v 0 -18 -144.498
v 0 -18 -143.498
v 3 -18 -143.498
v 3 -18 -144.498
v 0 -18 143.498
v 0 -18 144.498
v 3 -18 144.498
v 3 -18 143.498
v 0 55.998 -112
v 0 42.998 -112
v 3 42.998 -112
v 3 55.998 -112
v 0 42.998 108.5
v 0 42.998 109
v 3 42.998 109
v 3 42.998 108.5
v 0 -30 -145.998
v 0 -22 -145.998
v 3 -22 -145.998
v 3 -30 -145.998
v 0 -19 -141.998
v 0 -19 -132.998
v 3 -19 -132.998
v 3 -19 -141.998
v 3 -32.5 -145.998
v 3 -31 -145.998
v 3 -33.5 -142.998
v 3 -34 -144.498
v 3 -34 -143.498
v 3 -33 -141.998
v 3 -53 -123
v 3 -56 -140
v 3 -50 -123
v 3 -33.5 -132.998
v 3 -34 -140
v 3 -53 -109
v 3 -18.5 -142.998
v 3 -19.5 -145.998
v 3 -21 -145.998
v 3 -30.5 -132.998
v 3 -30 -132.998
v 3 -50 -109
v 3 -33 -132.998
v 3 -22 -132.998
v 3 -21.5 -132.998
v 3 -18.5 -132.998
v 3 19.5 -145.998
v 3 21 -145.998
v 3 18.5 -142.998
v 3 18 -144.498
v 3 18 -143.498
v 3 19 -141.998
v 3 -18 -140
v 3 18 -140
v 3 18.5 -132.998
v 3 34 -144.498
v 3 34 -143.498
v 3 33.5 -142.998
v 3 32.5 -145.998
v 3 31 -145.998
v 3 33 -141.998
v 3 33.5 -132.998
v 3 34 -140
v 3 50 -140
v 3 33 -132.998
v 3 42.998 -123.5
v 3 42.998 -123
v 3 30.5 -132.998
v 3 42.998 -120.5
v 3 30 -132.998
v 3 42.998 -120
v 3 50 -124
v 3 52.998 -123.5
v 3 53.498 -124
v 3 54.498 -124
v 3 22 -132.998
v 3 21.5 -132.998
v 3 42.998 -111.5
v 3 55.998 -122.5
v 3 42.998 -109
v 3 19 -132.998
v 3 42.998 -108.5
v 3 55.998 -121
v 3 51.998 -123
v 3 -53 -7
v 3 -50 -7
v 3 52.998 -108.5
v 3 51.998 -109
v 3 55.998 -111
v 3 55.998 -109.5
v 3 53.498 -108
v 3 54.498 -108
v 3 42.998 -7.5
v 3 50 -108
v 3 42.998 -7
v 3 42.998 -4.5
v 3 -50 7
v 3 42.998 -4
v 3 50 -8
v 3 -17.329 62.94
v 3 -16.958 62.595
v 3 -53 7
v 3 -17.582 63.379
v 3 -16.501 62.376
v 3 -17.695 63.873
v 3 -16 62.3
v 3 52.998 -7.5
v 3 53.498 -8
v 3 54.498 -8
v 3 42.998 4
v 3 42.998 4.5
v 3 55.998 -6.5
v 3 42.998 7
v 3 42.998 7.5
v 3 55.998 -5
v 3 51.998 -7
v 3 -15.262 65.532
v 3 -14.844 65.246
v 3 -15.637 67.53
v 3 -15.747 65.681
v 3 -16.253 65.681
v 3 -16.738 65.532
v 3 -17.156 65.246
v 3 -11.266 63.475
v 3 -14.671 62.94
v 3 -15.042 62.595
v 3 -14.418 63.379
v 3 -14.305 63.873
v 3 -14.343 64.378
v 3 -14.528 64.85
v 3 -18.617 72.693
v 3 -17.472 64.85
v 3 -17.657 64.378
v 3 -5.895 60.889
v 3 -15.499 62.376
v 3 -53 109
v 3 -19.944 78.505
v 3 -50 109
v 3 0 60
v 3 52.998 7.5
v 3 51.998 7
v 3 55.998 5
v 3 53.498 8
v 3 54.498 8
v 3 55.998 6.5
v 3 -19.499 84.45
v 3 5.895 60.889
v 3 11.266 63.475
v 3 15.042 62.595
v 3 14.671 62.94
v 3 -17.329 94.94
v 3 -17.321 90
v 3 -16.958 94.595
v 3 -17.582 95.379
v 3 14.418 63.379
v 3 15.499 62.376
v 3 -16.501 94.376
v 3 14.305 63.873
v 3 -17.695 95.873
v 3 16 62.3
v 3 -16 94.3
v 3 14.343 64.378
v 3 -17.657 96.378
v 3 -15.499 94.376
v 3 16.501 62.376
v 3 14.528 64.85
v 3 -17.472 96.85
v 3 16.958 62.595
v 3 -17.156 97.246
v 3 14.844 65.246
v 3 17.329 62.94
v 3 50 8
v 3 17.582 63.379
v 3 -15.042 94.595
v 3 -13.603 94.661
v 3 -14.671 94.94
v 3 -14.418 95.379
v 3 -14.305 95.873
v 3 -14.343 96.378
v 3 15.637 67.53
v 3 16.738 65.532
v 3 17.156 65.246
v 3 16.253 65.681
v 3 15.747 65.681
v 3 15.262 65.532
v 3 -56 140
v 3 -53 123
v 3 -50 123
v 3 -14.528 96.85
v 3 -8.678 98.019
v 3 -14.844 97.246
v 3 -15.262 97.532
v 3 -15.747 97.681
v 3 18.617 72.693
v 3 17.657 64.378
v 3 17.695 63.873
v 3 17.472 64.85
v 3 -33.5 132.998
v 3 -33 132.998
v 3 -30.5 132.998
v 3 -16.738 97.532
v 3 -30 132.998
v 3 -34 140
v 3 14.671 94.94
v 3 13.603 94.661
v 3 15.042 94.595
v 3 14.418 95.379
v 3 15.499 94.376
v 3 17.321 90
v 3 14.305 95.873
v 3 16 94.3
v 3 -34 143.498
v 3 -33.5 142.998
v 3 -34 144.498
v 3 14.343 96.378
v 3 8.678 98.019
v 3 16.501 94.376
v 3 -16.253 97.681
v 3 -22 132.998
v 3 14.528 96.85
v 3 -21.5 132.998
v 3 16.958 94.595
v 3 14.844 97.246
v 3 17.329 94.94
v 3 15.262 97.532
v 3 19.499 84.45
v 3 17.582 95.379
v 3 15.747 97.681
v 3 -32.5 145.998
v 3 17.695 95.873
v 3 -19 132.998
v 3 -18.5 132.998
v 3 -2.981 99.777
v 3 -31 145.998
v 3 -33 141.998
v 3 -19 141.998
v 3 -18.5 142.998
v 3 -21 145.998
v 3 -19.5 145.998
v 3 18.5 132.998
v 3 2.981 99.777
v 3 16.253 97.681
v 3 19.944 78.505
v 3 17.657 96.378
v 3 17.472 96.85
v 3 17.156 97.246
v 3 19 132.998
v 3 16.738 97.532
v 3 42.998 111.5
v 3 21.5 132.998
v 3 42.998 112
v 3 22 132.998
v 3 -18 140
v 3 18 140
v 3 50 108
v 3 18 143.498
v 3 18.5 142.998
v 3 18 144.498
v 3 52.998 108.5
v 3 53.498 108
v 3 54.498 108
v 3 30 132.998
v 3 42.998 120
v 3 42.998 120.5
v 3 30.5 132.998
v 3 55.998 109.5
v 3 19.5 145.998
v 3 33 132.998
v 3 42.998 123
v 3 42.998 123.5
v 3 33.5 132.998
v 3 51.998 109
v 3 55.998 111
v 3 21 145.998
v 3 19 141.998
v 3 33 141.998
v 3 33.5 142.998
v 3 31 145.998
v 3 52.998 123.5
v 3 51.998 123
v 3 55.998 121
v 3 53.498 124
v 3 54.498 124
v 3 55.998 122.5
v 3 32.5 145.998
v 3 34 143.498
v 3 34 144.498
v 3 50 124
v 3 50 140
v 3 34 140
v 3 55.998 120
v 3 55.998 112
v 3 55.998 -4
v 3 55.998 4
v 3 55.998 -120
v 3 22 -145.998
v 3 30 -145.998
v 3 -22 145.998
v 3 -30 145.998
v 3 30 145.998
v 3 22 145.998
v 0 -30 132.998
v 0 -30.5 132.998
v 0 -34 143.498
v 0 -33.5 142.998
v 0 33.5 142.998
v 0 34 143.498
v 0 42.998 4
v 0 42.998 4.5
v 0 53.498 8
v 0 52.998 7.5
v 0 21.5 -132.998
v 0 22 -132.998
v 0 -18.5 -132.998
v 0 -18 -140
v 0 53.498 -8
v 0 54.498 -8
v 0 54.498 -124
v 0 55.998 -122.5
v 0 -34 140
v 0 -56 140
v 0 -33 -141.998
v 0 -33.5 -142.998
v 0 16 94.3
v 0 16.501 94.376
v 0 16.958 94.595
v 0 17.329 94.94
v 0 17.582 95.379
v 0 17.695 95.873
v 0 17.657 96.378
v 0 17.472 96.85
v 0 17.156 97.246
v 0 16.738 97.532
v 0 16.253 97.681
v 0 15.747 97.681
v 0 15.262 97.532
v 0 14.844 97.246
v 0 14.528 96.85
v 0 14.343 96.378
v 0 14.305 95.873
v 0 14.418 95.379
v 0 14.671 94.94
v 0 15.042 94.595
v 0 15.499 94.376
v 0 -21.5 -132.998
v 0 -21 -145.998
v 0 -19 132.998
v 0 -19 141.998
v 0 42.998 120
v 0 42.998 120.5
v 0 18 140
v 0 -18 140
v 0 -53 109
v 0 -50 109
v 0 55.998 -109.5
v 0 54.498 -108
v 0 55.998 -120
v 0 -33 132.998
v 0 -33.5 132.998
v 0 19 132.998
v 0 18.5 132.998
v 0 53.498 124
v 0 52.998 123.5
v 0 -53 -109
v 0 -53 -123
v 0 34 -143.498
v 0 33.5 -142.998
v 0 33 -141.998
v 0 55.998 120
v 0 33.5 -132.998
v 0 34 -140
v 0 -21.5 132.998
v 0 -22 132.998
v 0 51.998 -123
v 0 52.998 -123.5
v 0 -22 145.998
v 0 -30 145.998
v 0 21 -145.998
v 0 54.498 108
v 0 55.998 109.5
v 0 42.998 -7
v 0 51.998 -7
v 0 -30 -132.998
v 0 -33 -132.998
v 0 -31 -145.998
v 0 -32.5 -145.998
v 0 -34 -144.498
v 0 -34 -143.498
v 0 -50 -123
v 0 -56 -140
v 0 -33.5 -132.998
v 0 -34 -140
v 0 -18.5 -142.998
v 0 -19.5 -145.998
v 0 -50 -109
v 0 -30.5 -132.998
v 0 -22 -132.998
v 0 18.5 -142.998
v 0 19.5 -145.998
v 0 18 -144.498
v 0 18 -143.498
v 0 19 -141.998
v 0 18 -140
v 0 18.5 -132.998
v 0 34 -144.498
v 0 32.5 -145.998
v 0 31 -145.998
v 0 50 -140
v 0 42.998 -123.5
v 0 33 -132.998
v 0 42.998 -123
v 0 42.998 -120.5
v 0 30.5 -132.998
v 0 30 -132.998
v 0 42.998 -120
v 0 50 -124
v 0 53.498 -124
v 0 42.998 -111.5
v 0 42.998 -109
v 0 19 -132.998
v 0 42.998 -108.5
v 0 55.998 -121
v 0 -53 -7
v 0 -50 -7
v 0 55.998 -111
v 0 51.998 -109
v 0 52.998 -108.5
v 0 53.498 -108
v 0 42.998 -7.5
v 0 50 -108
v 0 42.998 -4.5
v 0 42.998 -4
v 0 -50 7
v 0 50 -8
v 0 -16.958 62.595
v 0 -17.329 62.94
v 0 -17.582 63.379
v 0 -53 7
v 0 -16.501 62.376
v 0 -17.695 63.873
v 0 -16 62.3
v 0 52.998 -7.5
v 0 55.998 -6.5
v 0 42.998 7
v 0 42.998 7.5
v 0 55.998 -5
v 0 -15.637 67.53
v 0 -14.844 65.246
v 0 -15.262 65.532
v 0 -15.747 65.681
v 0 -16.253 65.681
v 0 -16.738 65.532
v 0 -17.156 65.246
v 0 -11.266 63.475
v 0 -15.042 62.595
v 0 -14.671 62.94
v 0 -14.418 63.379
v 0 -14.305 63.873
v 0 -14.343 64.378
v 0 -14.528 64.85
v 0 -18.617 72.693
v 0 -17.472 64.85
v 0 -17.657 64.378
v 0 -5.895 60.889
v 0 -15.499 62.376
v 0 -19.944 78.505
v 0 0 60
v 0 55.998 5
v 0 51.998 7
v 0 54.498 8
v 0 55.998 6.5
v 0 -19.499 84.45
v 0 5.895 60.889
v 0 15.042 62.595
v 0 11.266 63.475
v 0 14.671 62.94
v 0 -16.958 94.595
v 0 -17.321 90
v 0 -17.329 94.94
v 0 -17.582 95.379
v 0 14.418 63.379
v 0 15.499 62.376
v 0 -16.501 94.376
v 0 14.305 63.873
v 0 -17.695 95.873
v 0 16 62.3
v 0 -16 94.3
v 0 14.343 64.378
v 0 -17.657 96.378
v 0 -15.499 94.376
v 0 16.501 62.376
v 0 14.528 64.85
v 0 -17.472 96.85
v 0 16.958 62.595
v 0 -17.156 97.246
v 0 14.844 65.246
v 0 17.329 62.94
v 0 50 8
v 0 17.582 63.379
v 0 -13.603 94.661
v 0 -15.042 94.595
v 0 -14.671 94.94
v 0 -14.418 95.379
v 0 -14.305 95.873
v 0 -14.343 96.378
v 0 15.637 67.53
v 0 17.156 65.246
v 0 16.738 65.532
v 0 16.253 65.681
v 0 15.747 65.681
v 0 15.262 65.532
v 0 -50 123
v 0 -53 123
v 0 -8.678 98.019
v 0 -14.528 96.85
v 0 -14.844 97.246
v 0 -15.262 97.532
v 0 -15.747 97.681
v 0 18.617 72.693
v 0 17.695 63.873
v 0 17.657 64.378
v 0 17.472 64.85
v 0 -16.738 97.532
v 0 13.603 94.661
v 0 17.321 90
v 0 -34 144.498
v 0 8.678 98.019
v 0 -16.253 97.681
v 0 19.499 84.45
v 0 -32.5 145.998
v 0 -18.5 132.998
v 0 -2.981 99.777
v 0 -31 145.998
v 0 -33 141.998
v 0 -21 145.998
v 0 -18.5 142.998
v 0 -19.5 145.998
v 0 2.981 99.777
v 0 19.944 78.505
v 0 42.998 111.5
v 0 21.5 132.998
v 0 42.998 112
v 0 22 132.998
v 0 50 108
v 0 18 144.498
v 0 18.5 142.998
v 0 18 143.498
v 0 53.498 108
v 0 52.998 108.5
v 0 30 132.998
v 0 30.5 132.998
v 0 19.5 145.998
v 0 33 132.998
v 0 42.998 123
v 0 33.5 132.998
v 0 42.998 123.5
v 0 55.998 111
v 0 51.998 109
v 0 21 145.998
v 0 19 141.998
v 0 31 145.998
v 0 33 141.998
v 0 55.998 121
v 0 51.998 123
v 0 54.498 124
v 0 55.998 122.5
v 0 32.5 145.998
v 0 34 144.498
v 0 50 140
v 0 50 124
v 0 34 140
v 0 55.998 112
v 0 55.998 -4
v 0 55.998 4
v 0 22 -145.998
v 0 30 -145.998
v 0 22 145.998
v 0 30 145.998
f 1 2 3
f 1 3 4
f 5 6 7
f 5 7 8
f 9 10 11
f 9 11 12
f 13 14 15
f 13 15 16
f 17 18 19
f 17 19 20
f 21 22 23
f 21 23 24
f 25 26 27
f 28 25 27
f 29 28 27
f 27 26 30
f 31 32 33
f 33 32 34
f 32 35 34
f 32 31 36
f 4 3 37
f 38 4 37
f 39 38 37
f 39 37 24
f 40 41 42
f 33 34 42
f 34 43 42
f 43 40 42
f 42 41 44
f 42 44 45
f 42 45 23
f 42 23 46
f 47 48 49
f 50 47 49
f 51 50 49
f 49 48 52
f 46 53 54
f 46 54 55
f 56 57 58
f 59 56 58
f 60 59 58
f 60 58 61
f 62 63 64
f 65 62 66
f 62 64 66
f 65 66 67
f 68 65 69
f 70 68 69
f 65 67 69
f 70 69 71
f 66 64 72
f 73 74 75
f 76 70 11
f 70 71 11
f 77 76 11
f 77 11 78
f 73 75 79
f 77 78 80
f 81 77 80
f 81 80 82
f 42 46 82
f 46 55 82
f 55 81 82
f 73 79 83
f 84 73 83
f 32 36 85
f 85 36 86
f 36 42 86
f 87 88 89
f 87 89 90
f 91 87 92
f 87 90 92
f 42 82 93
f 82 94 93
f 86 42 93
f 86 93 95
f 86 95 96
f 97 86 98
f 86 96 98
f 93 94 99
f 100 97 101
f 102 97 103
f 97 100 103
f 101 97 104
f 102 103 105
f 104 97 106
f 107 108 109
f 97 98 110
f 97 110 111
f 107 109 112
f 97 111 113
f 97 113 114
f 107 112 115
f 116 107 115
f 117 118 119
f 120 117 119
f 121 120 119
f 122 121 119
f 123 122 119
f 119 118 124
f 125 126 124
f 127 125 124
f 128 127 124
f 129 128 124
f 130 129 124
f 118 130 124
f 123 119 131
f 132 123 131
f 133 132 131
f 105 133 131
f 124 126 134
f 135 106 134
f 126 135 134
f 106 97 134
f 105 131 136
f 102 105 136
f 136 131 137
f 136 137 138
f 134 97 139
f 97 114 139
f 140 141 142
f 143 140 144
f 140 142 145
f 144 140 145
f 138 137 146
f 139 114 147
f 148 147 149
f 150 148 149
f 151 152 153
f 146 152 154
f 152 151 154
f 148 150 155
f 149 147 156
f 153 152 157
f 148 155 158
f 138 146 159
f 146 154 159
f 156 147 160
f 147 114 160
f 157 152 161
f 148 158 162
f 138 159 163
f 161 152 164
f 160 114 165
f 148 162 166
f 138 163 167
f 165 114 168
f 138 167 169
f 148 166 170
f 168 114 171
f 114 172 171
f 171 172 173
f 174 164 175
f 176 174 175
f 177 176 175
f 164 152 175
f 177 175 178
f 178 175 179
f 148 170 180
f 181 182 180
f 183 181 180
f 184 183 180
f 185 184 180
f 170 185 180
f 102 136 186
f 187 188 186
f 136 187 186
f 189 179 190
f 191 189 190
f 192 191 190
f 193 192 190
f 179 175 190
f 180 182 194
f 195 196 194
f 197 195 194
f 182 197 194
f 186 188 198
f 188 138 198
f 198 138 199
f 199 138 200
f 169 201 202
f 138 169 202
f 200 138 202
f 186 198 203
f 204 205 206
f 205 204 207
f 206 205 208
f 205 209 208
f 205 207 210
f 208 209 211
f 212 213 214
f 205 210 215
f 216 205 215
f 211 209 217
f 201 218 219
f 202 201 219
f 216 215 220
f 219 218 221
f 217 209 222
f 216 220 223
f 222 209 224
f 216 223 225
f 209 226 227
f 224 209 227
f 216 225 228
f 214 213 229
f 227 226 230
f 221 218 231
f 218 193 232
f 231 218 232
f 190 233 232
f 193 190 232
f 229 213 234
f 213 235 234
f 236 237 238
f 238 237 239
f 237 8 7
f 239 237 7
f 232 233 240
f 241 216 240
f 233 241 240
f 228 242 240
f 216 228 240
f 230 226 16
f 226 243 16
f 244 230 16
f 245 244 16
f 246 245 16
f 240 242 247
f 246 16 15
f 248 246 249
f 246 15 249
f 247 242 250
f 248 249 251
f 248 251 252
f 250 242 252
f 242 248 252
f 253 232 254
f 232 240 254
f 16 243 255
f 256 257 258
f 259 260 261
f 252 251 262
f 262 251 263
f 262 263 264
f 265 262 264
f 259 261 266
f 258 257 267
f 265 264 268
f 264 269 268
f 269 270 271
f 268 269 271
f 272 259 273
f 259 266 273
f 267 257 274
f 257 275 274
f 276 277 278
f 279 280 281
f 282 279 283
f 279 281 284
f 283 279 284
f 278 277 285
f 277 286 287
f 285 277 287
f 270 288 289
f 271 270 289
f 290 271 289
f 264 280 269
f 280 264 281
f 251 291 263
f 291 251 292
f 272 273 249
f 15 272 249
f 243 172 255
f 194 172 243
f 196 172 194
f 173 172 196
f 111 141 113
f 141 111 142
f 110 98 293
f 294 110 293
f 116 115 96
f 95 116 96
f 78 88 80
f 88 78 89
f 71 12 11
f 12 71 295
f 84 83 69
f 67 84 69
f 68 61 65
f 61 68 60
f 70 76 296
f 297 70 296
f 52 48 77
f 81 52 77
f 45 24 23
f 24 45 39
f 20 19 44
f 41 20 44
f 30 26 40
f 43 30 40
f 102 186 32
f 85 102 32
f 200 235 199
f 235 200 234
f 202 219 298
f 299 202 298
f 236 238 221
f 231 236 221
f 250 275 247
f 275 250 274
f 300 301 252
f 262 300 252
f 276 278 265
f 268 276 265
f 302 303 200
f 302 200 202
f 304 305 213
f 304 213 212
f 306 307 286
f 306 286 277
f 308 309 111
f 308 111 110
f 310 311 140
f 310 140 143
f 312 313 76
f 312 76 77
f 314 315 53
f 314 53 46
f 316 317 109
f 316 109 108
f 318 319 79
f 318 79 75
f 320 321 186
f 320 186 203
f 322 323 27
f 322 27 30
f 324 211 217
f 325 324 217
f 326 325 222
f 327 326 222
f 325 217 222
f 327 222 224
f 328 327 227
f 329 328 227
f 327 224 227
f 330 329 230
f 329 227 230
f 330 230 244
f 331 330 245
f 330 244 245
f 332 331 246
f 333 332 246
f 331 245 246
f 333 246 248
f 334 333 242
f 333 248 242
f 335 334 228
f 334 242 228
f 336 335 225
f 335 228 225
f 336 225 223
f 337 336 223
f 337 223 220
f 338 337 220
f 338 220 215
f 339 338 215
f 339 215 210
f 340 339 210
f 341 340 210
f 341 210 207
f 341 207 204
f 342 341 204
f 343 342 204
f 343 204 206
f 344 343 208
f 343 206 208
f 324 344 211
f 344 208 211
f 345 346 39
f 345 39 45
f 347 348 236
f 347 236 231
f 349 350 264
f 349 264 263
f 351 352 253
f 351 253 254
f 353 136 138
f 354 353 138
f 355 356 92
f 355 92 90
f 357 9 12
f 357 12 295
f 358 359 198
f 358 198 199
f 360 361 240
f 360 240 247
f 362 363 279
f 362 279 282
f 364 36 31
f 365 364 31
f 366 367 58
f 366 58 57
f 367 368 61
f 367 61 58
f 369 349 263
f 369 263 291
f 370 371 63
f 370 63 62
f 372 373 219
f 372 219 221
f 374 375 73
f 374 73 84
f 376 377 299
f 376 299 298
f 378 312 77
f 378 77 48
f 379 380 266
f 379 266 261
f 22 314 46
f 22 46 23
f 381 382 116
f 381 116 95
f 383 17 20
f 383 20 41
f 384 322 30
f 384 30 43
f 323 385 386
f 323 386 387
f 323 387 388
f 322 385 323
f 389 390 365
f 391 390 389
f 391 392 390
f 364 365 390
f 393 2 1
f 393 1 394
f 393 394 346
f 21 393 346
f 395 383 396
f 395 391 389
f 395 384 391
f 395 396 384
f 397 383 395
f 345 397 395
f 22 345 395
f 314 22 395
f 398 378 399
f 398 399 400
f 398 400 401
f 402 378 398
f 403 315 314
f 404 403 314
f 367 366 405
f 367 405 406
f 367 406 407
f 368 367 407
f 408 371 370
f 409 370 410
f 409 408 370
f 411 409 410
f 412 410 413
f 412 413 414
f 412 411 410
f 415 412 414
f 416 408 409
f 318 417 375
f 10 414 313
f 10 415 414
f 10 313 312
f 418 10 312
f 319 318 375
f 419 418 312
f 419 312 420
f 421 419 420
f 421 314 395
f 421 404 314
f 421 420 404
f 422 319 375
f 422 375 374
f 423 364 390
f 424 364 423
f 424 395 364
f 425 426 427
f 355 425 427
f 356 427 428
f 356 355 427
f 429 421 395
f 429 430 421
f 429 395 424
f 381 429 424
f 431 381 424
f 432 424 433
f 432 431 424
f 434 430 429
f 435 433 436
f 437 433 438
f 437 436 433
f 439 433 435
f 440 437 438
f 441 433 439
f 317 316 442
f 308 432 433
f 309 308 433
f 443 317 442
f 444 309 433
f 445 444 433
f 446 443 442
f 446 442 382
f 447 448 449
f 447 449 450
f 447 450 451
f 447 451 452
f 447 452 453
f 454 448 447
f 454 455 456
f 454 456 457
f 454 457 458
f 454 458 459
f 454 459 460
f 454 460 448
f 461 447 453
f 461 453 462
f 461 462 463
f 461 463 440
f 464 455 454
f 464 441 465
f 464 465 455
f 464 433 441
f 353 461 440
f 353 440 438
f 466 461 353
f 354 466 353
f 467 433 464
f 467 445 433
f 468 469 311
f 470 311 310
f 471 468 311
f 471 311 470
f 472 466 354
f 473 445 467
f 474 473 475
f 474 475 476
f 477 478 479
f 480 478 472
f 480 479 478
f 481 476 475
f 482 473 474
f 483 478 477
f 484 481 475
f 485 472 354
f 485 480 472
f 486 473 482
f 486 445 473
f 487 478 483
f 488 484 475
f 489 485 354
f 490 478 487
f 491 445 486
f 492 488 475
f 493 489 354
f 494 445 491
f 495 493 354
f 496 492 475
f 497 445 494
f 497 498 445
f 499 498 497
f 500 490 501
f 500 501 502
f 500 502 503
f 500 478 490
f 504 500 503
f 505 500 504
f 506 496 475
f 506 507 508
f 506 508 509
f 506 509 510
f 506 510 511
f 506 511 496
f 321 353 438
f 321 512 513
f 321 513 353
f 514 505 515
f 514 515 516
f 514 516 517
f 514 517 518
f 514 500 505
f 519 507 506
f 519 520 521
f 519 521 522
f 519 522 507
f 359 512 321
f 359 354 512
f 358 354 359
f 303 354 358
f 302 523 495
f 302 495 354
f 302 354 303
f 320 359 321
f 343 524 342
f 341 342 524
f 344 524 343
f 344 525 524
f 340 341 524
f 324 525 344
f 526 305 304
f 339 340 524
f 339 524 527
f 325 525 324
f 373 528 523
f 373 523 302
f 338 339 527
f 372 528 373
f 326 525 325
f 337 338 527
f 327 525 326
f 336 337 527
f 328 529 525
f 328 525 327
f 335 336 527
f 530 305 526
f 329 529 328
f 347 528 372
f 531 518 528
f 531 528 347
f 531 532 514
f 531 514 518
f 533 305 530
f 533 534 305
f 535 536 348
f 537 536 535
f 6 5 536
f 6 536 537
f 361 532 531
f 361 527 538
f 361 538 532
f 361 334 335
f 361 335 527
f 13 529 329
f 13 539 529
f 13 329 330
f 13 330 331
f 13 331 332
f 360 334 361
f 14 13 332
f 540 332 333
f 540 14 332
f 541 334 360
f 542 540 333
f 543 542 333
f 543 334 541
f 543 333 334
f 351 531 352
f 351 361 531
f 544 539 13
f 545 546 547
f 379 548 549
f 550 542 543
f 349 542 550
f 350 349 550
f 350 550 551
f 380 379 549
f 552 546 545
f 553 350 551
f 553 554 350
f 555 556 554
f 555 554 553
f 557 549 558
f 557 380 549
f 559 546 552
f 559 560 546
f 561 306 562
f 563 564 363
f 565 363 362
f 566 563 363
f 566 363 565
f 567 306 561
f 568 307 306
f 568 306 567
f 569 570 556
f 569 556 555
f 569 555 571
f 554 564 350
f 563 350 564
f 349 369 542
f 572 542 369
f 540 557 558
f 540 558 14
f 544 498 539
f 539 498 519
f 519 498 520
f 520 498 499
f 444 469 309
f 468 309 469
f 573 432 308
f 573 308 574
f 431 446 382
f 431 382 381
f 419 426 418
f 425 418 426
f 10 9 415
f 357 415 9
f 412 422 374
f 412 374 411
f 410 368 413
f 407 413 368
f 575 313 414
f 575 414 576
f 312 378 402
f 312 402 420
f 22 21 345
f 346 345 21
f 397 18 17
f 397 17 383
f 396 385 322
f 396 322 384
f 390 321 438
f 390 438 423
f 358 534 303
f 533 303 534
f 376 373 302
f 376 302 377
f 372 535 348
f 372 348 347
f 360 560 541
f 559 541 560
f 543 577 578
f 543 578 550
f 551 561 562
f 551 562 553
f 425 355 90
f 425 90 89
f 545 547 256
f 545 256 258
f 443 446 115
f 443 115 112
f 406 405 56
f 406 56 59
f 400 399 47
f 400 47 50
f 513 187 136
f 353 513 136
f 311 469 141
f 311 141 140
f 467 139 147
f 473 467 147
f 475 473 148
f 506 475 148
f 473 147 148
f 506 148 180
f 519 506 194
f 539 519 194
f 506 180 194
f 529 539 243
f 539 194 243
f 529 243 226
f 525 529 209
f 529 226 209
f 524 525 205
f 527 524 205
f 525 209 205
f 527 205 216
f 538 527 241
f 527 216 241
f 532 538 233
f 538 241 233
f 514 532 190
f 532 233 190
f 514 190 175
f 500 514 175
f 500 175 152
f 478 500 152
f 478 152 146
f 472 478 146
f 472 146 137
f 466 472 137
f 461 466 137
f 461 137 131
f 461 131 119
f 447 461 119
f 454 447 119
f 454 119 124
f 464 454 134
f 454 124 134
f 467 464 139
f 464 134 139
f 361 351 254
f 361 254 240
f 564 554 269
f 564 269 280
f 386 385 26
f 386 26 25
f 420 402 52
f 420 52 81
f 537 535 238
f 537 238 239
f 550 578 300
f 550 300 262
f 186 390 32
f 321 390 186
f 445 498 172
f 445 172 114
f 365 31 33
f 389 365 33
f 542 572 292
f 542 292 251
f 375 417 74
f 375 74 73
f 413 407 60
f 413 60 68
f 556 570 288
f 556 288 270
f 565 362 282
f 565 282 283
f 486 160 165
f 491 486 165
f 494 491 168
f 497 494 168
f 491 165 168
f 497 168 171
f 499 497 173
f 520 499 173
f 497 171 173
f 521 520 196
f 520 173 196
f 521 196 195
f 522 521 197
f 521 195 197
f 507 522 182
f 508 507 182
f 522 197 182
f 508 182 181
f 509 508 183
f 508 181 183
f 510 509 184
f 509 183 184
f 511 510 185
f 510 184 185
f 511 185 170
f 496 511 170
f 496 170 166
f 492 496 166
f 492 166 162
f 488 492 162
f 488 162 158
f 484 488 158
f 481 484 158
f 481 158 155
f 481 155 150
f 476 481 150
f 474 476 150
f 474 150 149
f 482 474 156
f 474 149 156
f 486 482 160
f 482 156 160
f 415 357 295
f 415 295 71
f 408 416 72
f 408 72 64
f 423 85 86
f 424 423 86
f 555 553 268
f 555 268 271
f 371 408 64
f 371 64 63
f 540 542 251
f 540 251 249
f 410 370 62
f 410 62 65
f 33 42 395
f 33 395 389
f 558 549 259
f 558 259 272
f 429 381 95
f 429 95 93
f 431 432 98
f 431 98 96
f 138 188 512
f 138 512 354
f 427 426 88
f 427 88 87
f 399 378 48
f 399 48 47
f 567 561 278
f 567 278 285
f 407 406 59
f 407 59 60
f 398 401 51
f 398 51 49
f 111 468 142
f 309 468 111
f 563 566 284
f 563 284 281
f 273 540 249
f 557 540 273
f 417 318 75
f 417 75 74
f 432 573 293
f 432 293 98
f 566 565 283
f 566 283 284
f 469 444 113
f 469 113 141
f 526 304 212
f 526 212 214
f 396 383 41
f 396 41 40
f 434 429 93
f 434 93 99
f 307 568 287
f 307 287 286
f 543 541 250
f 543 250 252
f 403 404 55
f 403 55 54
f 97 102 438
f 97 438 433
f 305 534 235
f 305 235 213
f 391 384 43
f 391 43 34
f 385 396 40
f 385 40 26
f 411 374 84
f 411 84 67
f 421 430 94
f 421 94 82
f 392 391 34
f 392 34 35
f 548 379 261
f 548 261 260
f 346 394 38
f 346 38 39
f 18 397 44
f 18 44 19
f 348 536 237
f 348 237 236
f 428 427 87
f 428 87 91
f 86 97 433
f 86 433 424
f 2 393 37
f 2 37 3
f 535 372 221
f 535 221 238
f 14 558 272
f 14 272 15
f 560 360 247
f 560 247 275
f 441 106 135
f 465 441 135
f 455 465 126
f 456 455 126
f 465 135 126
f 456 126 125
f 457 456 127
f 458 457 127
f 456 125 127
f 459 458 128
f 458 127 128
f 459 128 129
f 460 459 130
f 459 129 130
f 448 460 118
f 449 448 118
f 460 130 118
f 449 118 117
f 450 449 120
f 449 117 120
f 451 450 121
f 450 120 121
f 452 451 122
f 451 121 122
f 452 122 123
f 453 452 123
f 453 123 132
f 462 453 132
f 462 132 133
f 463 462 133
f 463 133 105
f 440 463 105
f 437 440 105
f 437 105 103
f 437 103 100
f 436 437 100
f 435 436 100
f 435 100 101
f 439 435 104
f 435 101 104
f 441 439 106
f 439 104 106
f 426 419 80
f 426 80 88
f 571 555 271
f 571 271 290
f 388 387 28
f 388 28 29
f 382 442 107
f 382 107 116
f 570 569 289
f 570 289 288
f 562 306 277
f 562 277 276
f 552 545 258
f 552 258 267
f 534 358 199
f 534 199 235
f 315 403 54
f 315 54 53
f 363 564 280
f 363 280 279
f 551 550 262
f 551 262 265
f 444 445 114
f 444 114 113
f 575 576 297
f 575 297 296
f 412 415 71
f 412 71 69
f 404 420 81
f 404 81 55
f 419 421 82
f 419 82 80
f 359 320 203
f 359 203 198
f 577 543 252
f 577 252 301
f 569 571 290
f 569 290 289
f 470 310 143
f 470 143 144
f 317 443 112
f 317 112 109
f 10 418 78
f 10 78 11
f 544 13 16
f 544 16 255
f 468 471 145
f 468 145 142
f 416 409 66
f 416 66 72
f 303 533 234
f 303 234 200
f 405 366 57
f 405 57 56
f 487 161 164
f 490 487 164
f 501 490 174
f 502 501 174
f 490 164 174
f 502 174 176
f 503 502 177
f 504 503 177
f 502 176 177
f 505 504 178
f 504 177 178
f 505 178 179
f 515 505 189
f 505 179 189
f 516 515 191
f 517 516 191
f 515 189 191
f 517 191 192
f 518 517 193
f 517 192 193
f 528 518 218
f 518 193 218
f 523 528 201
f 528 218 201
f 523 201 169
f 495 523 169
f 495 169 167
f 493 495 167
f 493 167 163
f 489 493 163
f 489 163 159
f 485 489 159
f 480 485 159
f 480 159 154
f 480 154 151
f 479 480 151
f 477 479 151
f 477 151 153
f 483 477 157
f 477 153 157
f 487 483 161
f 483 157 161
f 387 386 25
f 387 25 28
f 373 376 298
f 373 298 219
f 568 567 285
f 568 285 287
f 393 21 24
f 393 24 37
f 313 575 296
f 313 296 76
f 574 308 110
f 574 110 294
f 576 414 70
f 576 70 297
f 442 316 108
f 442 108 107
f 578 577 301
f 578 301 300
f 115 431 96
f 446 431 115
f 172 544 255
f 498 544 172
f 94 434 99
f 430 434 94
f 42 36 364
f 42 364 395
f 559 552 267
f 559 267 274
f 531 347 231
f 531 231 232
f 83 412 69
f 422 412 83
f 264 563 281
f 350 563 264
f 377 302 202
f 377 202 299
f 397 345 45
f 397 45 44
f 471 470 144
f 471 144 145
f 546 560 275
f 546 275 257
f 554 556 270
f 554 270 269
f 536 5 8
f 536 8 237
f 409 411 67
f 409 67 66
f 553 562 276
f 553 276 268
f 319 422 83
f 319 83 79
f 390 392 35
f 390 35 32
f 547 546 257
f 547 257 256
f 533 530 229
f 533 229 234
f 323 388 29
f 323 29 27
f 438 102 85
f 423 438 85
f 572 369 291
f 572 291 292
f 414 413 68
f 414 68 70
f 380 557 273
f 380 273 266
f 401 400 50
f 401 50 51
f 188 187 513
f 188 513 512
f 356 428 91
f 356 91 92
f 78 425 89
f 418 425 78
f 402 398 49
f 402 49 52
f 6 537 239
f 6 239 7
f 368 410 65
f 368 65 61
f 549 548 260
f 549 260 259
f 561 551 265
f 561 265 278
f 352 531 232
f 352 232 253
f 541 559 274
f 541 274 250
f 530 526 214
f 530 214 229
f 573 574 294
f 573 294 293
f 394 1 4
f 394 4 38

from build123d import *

# Parameters (mm, degrees)
BOSS_EXTRUDE1_DEPTH = 3
SKETCH3_W           = 14
SKETCH3_H           = 3
CUT_EXTRUDE1_DEPTH  = 3
SKETCH7_R           = 20
CUT_EXTRUDE2_DEPTH  = 3
SKETCH9_R           = 1.7
CUT_EXTRUDE3_DEPTH  = 3


with BuildPart() as part:
    # Sketch1 → Boss-Extrude1 (new body)
    with BuildSketch(Plane(origin=(0, 0, 0), x_dir=(0, 0, -1), z_dir=(1, 0, 0))):
        Polygon((-140, 34), (-140, 50), (-124, 50), (-123.5, 42.997828908), (-123, 42.997828908), (-123, 51.997828908), (-123.5, 52.997828908), (-124, 53.497828908), (-124, 54.497828908), (-122.5, 55.997828908), (-121, 55.997828908), (-120.5, 42.997828908), (-120, 42.997828908), (-120, 55.997828908), (-112, 55.997828908), (-112, 42.997828908), (-111.5, 42.997828908), (-111, 55.997828908), (-109.5, 55.997828908), (-108, 54.497828908), (-108, 53.497828908), (-108.5, 52.997828908), (-109, 51.997828908), (-109, 42.997828908), (-108.5, 42.997828908), (-108, 50), (-8, 50), (-7.5, 42.997828908), (-7, 42.997828908), (-7, 51.997828908), (-7.5, 52.997828908), (-8, 53.497828908), (-8, 54.497828908), (-6.5, 55.997828908), (-5, 55.997828908), (-4.5, 42.997828908), (-4, 42.997828908), (-4, 55.997828908), (4, 55.997828908), (4, 42.997828908), (4.5, 42.997828908), (5, 55.997828908), (6.5, 55.997828908), (8, 54.497828908), (8, 53.497828908), (7.5, 52.997828908), (7, 51.997828908), (7, 42.997828908), (7.5, 42.997828908), (8, 50), (108, 50), (108.5, 42.997828908), (109, 42.997828908), (109, 51.997828908), (108.5, 52.997828908), (108, 53.497828908), (108, 54.497828908), (109.5, 55.997828908), (111, 55.997828908), (111.5, 42.997828908), (112, 42.997828908), (112, 55.997828908), (120, 55.997828908), (120, 42.997828908), (120.5, 42.997828908), (121, 55.997828908), (122.5, 55.997828908), (124, 54.497828908), (124, 53.497828908), (123.5, 52.997828908), (123, 51.997828908), (123, 42.997828908), (123.5, 42.997828908), (124, 50), (140, 50), (140, 34), (132.997828908, 33.5), (132.997828908, 33), (141.997828908, 33), (142.997828908, 33.5), (143.497828908, 34), (144.497828908, 34), (145.997828908, 32.5), (145.997828908, 31), (132.997828908, 30.5), (132.997828908, 30), (145.997828908, 30), (145.997828908, 22), (132.997828908, 22), (132.997828908, 21.5), (145.997828908, 21), (145.997828908, 19.5), (144.497828908, 18), (143.497828908, 18), (142.997828908, 18.5), (141.997828908, 19), (132.997828908, 19), (132.997828908, 18.5), (140, 18), (140, -18), (132.997828908, -18.5), (132.997828908, -19), (141.997828908, -19), (142.997828908, -18.5), (143.497828908, -18), (144.497828908, -18), (145.997828908, -19.5), (145.997828908, -21), (132.997828908, -21.5), (132.997828908, -22), (145.997828908, -22), (145.997828908, -30), (132.997828908, -30), (132.997828908, -30.5), (145.997828908, -31), (145.997828908, -32.5), (144.497828908, -34), (143.497828908, -34), (142.997828908, -33.5), (141.997828908, -33), (132.997828908, -33), (132.997828908, -33.5), (140, -34), (140, -56), (-140, -56), (-140, -34), (-132.997828908, -33.5), (-132.997828908, -33), (-141.997828908, -33), (-142.997828908, -33.5), (-143.497828908, -34), (-144.497828908, -34), (-145.997828908, -32.5), (-145.997828908, -31), (-132.997828908, -30.5), (-132.997828908, -30), (-145.997828908, -30), (-145.997828908, -22), (-132.997828908, -22), (-132.997828908, -21.5), (-145.997828908, -21), (-145.997828908, -19.5), (-144.497828908, -18), (-143.497828908, -18), (-142.997828908, -18.5), (-141.997828908, -19), (-132.997828908, -19), (-132.997828908, -18.5), (-140, -18), (-140, 18), (-132.997828908, 18.5), (-132.997828908, 19), (-141.997828908, 19), (-142.997828908, 18.5), (-143.497828908, 18), (-144.497828908, 18), (-145.997828908, 19.5), (-145.997828908, 21), (-132.997828908, 21.5), (-132.997828908, 22), (-145.997828908, 22), (-145.997828908, 30), (-132.997828908, 30), (-132.997828908, 30.5), (-145.997828908, 31), (-145.997828908, 32.5), (-144.497828908, 34), (-143.497828908, 34), (-142.997828908, 33.5), (-141.997828908, 33), (-132.997828908, 33), (-132.997828908, 33.5), align=None)
    extrude(amount=BOSS_EXTRUDE1_DEPTH)

    # Sketch3 → Cut-Extrude1 (cut)
    with BuildSketch(Plane(origin=(3, 0, 0), x_dir=(0, 0, -1), z_dir=(1, 0, 0))):
        with Locations((-116, -51.5)):
            Rectangle(SKETCH3_W, SKETCH3_H)
        with Locations((0, -51.5)):
            Rectangle(SKETCH3_W, SKETCH3_H)
        with Locations((116, -51.5)):
            Rectangle(SKETCH3_W, SKETCH3_H)
    extrude(amount=-CUT_EXTRUDE1_DEPTH, mode=Mode.SUBTRACT)

    # Sketch7 → Cut-Extrude2 (cut)
    with BuildSketch(Plane(origin=(3, 0, 0), x_dir=(0, 0, -1), z_dir=(1, 0, 0))):
        with Locations((-80, 0)):
            Circle(SKETCH7_R)
    extrude(amount=-CUT_EXTRUDE2_DEPTH, mode=Mode.SUBTRACT)

    # Sketch9 → Cut-Extrude3 (cut)
    with BuildSketch(Plane(origin=(3, 0, 0), x_dir=(0, 0, -1), z_dir=(1, 0, 0))):
        with Locations((-96, 16)):
            Circle(SKETCH9_R)
        with Locations((-64, 16)):
            Circle(SKETCH9_R)
        with Locations((-64, -16)):
            Circle(SKETCH9_R)
        with Locations((-96, -16)):
            Circle(SKETCH9_R)
    extrude(amount=-CUT_EXTRUDE3_DEPTH, mode=Mode.SUBTRACT)


solid = part.part
